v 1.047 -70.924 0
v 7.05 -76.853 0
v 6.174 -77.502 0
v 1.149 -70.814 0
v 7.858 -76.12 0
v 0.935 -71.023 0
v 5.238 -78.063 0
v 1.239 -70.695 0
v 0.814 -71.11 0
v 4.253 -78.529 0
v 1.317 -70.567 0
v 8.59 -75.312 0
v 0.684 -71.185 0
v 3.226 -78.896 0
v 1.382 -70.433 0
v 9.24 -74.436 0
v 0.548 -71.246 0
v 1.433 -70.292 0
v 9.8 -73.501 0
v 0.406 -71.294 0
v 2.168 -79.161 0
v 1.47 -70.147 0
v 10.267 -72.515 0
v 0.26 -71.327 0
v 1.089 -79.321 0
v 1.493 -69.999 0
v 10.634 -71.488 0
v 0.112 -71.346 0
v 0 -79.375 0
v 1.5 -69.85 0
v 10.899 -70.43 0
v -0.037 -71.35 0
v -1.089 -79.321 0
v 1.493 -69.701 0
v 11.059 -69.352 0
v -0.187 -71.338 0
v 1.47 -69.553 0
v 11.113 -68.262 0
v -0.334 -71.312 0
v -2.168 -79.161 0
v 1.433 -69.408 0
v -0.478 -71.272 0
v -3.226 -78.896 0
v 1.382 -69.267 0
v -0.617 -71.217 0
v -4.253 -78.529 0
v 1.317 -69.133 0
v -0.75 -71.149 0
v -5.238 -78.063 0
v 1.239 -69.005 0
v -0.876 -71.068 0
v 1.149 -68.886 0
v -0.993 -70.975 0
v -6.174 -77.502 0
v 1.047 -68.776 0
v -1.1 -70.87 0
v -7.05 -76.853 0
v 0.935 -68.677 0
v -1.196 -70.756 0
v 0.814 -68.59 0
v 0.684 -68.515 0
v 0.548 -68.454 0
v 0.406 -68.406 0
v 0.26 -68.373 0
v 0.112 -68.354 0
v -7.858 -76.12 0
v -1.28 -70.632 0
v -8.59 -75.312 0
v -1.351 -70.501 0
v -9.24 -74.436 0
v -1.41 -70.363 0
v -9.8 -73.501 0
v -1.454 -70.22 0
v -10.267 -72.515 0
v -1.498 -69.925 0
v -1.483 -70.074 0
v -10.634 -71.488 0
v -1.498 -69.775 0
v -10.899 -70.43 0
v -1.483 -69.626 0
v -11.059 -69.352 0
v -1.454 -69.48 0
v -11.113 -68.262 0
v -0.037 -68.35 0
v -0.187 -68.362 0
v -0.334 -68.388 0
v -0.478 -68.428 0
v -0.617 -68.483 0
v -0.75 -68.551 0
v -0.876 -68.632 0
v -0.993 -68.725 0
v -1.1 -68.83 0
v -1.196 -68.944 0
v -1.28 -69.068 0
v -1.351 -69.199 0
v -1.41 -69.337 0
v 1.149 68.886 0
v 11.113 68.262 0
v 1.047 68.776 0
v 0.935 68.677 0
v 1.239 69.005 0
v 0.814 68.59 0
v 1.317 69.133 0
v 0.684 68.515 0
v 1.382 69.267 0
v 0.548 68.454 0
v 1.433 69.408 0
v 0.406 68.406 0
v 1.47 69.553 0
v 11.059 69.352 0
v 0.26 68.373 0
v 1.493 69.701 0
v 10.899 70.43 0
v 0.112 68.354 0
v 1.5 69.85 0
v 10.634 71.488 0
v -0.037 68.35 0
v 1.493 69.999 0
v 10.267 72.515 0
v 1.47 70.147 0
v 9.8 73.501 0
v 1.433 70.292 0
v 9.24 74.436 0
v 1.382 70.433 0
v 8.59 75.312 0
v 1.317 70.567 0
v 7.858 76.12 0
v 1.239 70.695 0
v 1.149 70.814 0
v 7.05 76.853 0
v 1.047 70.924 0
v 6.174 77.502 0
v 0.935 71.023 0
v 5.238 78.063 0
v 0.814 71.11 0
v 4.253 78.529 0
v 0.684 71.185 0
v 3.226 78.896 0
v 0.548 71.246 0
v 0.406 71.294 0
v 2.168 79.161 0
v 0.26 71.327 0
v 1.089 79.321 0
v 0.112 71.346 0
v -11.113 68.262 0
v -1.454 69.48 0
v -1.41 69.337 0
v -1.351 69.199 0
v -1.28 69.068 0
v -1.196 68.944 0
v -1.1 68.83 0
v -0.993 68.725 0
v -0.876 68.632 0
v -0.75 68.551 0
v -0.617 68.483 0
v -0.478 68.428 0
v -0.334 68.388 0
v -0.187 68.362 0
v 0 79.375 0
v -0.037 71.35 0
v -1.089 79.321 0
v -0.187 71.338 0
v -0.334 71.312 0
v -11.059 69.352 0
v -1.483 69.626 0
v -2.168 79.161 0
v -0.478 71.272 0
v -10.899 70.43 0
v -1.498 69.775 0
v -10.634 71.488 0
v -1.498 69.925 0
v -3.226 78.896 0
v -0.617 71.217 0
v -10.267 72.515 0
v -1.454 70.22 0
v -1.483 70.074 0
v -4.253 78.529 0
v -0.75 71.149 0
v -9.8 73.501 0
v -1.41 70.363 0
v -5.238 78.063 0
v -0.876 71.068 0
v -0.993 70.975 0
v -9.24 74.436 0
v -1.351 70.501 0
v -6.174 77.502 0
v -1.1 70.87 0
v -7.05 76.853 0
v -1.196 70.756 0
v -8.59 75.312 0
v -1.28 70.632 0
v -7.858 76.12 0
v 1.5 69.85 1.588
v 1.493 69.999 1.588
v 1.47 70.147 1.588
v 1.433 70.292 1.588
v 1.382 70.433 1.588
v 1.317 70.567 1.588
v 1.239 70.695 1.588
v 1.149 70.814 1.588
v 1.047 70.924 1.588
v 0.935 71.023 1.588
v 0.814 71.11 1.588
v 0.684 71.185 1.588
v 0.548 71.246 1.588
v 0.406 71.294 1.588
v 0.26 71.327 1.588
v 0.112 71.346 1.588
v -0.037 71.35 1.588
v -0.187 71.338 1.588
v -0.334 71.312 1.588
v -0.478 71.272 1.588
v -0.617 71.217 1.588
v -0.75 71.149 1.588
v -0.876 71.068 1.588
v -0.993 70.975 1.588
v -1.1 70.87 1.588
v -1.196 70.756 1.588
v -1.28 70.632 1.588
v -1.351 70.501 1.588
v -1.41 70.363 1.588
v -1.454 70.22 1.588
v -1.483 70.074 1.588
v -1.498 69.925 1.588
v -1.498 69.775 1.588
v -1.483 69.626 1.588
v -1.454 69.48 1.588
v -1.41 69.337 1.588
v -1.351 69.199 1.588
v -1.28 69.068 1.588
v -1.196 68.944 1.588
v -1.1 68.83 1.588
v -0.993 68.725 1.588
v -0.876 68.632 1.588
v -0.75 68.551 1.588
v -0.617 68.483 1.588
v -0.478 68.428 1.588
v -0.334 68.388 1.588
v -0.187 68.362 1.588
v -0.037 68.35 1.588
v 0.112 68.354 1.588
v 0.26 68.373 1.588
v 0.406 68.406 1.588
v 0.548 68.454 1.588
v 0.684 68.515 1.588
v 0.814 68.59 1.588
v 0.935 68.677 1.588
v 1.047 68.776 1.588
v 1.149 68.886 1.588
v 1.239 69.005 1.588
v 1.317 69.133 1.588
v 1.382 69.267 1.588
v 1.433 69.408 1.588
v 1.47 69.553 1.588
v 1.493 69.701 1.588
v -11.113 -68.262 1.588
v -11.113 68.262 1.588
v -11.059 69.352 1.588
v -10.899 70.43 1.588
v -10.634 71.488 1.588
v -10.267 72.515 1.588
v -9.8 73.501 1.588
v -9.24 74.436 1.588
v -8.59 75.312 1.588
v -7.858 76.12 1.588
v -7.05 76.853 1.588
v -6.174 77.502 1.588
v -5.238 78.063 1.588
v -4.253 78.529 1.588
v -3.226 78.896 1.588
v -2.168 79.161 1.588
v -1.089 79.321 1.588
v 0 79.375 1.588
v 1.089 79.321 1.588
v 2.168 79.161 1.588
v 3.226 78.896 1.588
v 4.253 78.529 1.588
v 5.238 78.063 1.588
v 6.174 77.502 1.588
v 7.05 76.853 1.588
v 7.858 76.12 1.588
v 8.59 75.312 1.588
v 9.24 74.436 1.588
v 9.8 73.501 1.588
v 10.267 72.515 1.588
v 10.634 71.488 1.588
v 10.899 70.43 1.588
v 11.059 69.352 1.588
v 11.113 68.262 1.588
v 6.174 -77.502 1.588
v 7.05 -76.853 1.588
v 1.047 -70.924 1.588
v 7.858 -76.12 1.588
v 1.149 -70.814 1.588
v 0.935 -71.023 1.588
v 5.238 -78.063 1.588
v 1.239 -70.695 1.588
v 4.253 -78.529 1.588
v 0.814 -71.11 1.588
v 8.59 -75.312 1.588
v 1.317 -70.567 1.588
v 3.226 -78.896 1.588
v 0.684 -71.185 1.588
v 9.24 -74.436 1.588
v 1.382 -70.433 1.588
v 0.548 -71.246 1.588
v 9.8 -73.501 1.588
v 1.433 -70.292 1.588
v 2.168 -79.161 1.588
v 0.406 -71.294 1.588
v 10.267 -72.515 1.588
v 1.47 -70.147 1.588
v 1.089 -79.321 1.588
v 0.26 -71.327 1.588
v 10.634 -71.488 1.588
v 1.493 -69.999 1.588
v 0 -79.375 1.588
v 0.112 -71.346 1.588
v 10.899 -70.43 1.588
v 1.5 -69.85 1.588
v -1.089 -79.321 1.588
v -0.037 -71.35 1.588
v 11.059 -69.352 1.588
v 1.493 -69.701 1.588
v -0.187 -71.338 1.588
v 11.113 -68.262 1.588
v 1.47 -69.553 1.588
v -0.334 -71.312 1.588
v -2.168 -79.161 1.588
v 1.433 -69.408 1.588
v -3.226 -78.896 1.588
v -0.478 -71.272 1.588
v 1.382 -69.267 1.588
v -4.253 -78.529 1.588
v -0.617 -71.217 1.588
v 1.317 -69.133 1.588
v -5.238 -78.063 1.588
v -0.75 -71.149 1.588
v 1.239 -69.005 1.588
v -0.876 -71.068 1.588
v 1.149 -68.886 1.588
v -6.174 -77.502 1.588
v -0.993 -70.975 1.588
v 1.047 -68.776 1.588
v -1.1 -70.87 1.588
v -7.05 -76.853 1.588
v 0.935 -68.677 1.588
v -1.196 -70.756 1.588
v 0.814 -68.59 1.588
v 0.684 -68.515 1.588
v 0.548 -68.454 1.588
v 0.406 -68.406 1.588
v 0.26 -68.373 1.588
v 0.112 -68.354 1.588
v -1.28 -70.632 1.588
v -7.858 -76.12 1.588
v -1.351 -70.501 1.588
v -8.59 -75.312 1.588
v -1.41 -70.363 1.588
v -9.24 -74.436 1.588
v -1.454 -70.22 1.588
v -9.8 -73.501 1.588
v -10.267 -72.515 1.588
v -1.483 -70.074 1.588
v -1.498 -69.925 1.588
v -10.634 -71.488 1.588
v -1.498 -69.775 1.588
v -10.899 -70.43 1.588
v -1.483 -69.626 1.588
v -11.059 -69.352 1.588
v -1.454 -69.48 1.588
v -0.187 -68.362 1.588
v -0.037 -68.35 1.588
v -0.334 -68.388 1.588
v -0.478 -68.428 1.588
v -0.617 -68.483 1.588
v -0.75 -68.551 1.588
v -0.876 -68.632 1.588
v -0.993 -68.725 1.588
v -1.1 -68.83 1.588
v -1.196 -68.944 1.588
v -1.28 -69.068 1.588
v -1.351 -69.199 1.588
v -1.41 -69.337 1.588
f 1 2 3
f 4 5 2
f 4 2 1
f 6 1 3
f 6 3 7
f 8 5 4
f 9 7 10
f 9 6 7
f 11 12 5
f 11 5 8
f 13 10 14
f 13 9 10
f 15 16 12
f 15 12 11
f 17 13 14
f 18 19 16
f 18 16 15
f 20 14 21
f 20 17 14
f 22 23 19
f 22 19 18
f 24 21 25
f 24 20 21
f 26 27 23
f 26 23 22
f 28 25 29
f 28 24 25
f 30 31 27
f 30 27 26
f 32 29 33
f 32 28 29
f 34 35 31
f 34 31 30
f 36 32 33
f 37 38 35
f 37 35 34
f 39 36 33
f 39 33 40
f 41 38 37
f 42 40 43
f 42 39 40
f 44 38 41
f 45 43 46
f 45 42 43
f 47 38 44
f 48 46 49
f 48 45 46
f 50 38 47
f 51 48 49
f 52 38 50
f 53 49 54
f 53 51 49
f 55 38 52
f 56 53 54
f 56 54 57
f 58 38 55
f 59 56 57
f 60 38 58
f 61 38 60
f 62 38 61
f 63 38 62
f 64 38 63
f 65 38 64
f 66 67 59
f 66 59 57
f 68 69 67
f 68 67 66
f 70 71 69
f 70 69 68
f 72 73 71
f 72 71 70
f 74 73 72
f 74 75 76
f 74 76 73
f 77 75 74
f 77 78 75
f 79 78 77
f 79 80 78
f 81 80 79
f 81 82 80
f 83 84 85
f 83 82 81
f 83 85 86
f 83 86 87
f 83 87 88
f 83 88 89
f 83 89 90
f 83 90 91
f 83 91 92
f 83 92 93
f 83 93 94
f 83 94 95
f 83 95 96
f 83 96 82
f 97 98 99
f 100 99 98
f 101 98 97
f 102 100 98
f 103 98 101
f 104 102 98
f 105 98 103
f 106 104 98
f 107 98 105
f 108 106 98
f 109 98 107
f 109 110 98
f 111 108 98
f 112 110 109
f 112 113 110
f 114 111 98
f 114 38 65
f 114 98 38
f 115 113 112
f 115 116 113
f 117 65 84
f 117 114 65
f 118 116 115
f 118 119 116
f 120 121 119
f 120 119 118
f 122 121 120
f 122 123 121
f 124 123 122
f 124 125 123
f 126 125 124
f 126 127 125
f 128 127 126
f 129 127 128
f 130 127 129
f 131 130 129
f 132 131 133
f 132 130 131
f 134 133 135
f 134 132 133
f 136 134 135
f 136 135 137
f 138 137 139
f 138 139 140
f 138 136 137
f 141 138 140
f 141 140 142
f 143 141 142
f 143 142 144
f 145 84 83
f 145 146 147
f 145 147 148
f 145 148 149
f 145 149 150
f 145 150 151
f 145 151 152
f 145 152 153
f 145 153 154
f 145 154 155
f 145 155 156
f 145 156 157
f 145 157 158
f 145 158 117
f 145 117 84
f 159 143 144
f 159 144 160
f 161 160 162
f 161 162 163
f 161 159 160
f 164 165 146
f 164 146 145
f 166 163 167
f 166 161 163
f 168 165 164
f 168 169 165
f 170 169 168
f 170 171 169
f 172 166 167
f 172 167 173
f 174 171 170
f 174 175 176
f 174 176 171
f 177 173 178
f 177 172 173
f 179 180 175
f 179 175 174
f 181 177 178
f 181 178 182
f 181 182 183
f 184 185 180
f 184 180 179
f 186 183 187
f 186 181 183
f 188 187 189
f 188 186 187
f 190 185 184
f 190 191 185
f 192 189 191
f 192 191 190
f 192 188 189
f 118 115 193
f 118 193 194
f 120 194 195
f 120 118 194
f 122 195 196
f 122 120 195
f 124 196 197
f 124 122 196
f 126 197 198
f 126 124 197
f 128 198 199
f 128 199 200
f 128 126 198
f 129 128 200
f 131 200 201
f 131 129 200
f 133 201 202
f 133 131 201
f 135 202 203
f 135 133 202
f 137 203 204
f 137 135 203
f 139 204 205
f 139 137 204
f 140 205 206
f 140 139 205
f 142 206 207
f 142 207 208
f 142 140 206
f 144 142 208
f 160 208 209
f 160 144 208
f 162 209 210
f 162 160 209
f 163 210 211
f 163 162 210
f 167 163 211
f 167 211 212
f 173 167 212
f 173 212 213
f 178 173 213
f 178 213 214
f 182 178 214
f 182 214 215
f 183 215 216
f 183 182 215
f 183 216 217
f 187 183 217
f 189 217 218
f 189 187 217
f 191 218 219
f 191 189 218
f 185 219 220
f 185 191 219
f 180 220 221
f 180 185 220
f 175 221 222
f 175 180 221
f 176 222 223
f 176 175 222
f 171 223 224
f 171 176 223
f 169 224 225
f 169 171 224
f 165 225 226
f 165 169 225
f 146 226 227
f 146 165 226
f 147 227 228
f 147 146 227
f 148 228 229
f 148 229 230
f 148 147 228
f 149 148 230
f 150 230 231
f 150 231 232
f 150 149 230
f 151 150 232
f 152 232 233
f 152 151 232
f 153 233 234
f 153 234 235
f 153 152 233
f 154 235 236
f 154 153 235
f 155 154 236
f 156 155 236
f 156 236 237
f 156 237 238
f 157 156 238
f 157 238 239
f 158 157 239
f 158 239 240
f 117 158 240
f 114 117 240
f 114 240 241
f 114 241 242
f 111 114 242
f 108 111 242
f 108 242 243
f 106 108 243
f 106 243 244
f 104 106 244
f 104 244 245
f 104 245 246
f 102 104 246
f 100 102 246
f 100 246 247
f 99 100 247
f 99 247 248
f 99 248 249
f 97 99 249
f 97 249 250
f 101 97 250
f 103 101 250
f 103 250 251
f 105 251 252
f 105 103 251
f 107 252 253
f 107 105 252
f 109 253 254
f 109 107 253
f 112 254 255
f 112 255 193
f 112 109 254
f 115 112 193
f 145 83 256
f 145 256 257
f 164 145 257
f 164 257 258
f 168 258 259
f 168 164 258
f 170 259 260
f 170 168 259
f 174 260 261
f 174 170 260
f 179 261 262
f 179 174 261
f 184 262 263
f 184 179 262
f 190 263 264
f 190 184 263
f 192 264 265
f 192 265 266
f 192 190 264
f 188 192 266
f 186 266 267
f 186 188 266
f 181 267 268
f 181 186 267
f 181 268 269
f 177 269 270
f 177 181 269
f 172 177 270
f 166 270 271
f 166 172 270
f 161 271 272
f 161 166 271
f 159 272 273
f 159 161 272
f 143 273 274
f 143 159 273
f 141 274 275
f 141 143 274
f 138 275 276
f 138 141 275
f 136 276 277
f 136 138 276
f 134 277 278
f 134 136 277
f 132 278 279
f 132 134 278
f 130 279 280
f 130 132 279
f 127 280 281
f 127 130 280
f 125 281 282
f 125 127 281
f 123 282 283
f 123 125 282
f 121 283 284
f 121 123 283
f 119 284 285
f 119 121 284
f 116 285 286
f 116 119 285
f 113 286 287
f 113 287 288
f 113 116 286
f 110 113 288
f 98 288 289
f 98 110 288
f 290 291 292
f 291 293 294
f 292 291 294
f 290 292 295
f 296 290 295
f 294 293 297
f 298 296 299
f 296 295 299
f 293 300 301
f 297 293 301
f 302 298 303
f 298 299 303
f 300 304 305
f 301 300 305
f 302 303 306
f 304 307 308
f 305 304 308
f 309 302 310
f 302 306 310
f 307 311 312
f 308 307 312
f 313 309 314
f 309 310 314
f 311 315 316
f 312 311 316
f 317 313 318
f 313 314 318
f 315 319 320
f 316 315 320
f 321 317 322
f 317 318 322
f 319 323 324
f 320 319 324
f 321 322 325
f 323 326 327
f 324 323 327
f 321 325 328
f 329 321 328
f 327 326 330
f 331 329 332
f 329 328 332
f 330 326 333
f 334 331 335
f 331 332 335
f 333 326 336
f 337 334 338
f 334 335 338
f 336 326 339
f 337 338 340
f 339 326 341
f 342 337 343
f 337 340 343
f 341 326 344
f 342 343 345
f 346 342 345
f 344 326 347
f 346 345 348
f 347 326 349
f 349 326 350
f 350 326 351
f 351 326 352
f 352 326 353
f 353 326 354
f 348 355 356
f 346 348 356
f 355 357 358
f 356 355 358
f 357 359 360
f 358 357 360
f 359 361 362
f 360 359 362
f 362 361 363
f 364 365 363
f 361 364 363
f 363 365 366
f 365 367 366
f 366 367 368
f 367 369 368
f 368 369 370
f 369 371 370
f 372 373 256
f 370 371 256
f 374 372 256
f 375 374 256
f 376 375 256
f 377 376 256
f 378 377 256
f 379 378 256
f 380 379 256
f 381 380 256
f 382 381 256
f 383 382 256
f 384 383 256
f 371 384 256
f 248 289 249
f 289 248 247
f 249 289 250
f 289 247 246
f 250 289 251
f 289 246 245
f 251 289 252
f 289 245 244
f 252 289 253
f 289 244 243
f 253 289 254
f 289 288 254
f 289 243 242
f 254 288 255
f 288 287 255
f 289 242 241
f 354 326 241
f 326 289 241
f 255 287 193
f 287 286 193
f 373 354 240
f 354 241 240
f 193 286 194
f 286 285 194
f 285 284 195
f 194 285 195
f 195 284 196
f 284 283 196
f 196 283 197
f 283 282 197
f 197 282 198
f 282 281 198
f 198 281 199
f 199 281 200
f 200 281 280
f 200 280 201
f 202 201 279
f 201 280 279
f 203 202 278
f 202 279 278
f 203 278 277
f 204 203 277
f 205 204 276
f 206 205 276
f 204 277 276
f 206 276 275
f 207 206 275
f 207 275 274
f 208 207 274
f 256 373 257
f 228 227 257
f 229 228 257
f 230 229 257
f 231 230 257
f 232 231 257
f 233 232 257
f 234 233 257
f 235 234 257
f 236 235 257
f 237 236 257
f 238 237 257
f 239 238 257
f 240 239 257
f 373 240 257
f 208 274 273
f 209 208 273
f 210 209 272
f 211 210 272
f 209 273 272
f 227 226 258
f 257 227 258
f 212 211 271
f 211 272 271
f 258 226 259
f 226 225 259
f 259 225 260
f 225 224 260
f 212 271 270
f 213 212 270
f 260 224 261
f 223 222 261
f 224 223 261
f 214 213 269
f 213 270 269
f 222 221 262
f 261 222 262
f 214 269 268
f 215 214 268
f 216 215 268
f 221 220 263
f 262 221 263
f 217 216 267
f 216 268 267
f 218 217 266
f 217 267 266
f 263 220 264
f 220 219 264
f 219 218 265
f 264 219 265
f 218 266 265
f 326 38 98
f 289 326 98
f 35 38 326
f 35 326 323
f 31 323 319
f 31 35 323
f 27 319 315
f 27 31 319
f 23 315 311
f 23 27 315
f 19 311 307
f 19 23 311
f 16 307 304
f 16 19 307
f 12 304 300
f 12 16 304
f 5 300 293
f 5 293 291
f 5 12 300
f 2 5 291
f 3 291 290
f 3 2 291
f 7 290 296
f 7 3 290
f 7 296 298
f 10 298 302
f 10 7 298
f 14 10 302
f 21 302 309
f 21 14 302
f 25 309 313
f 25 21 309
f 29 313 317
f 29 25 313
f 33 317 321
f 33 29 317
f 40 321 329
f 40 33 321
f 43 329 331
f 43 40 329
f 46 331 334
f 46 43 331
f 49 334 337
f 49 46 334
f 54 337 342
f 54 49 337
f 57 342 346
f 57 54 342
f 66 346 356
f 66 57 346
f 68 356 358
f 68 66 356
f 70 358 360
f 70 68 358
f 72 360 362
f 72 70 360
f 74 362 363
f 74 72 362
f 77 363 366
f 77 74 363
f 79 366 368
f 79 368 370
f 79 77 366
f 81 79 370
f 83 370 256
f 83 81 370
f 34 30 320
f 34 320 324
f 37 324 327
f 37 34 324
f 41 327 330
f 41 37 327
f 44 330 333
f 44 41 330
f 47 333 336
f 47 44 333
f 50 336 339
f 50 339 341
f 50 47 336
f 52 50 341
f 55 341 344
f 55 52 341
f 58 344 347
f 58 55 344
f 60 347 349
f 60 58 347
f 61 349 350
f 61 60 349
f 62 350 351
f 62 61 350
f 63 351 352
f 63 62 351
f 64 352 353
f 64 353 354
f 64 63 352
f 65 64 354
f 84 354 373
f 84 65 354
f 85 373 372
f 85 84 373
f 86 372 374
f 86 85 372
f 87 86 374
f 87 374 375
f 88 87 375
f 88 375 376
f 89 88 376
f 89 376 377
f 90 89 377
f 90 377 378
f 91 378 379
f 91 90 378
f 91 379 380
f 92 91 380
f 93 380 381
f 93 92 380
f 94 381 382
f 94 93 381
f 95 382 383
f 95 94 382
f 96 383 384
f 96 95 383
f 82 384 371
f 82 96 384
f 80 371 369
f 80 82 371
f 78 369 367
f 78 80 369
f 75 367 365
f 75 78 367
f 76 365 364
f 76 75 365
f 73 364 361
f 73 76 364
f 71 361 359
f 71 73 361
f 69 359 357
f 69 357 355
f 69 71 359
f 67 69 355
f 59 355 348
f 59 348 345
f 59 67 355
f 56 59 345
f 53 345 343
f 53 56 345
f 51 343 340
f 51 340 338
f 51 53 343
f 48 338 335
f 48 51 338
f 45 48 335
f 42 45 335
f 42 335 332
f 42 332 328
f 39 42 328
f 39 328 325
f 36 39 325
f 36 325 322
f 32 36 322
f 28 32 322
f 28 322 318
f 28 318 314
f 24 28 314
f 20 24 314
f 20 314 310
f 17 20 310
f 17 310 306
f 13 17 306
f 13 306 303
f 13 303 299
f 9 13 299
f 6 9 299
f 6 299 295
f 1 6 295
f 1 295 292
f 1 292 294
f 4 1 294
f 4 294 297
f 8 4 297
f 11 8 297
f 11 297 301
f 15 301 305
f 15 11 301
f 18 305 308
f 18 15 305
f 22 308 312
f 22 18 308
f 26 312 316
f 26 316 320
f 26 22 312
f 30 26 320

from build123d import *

# Parameters (mm, degrees)
SKETCH1_R           = 1.5
SKETCH1_W           = 11.1125
SKETCH1_H           = 136.525
BOSS_EXTRUDE1_DEPTH = 1.5875


with BuildPart() as part:
    # Sketch1 → Boss-Extrude1 (new body)
    # profile 1 of 4: a face of its own
    with BuildSketch(Plane.XY):
        with BuildLine():
            ThreePointArc((-11.1125, 68.2625), (0, 79.375), (11.1125, 68.2625))
            Line((11.1125, 68.2625), (-11.1125, 68.2625))
        make_face()
        with Locations((0, 69.85)):
            Circle(SKETCH1_R, mode=Mode.SUBTRACT)
    # profile 2 of 4: a face of its own
    with BuildSketch(Plane.XY):
        with Locations((5.55625, 0)):
            Rectangle(SKETCH1_W, SKETCH1_H)
    # profile 3 of 4: a face of its own
    with BuildSketch(Plane.XY):
        with Locations((-5.55625, 0)):
            Rectangle(SKETCH1_W, SKETCH1_H)
    # profile 4 of 4: a face of its own
    with BuildSketch(Plane.XY):
        with BuildLine():
            Line((-11.1125, -68.2625), (11.1125, -68.2625))
            ThreePointArc((11.1125, -68.2625), (0, -79.375), (-11.1125, -68.2625))
        make_face()
        with Locations((0, -69.85)):
            Circle(SKETCH1_R, mode=Mode.SUBTRACT)
    extrude(amount=BOSS_EXTRUDE1_DEPTH)


solid = part.part
